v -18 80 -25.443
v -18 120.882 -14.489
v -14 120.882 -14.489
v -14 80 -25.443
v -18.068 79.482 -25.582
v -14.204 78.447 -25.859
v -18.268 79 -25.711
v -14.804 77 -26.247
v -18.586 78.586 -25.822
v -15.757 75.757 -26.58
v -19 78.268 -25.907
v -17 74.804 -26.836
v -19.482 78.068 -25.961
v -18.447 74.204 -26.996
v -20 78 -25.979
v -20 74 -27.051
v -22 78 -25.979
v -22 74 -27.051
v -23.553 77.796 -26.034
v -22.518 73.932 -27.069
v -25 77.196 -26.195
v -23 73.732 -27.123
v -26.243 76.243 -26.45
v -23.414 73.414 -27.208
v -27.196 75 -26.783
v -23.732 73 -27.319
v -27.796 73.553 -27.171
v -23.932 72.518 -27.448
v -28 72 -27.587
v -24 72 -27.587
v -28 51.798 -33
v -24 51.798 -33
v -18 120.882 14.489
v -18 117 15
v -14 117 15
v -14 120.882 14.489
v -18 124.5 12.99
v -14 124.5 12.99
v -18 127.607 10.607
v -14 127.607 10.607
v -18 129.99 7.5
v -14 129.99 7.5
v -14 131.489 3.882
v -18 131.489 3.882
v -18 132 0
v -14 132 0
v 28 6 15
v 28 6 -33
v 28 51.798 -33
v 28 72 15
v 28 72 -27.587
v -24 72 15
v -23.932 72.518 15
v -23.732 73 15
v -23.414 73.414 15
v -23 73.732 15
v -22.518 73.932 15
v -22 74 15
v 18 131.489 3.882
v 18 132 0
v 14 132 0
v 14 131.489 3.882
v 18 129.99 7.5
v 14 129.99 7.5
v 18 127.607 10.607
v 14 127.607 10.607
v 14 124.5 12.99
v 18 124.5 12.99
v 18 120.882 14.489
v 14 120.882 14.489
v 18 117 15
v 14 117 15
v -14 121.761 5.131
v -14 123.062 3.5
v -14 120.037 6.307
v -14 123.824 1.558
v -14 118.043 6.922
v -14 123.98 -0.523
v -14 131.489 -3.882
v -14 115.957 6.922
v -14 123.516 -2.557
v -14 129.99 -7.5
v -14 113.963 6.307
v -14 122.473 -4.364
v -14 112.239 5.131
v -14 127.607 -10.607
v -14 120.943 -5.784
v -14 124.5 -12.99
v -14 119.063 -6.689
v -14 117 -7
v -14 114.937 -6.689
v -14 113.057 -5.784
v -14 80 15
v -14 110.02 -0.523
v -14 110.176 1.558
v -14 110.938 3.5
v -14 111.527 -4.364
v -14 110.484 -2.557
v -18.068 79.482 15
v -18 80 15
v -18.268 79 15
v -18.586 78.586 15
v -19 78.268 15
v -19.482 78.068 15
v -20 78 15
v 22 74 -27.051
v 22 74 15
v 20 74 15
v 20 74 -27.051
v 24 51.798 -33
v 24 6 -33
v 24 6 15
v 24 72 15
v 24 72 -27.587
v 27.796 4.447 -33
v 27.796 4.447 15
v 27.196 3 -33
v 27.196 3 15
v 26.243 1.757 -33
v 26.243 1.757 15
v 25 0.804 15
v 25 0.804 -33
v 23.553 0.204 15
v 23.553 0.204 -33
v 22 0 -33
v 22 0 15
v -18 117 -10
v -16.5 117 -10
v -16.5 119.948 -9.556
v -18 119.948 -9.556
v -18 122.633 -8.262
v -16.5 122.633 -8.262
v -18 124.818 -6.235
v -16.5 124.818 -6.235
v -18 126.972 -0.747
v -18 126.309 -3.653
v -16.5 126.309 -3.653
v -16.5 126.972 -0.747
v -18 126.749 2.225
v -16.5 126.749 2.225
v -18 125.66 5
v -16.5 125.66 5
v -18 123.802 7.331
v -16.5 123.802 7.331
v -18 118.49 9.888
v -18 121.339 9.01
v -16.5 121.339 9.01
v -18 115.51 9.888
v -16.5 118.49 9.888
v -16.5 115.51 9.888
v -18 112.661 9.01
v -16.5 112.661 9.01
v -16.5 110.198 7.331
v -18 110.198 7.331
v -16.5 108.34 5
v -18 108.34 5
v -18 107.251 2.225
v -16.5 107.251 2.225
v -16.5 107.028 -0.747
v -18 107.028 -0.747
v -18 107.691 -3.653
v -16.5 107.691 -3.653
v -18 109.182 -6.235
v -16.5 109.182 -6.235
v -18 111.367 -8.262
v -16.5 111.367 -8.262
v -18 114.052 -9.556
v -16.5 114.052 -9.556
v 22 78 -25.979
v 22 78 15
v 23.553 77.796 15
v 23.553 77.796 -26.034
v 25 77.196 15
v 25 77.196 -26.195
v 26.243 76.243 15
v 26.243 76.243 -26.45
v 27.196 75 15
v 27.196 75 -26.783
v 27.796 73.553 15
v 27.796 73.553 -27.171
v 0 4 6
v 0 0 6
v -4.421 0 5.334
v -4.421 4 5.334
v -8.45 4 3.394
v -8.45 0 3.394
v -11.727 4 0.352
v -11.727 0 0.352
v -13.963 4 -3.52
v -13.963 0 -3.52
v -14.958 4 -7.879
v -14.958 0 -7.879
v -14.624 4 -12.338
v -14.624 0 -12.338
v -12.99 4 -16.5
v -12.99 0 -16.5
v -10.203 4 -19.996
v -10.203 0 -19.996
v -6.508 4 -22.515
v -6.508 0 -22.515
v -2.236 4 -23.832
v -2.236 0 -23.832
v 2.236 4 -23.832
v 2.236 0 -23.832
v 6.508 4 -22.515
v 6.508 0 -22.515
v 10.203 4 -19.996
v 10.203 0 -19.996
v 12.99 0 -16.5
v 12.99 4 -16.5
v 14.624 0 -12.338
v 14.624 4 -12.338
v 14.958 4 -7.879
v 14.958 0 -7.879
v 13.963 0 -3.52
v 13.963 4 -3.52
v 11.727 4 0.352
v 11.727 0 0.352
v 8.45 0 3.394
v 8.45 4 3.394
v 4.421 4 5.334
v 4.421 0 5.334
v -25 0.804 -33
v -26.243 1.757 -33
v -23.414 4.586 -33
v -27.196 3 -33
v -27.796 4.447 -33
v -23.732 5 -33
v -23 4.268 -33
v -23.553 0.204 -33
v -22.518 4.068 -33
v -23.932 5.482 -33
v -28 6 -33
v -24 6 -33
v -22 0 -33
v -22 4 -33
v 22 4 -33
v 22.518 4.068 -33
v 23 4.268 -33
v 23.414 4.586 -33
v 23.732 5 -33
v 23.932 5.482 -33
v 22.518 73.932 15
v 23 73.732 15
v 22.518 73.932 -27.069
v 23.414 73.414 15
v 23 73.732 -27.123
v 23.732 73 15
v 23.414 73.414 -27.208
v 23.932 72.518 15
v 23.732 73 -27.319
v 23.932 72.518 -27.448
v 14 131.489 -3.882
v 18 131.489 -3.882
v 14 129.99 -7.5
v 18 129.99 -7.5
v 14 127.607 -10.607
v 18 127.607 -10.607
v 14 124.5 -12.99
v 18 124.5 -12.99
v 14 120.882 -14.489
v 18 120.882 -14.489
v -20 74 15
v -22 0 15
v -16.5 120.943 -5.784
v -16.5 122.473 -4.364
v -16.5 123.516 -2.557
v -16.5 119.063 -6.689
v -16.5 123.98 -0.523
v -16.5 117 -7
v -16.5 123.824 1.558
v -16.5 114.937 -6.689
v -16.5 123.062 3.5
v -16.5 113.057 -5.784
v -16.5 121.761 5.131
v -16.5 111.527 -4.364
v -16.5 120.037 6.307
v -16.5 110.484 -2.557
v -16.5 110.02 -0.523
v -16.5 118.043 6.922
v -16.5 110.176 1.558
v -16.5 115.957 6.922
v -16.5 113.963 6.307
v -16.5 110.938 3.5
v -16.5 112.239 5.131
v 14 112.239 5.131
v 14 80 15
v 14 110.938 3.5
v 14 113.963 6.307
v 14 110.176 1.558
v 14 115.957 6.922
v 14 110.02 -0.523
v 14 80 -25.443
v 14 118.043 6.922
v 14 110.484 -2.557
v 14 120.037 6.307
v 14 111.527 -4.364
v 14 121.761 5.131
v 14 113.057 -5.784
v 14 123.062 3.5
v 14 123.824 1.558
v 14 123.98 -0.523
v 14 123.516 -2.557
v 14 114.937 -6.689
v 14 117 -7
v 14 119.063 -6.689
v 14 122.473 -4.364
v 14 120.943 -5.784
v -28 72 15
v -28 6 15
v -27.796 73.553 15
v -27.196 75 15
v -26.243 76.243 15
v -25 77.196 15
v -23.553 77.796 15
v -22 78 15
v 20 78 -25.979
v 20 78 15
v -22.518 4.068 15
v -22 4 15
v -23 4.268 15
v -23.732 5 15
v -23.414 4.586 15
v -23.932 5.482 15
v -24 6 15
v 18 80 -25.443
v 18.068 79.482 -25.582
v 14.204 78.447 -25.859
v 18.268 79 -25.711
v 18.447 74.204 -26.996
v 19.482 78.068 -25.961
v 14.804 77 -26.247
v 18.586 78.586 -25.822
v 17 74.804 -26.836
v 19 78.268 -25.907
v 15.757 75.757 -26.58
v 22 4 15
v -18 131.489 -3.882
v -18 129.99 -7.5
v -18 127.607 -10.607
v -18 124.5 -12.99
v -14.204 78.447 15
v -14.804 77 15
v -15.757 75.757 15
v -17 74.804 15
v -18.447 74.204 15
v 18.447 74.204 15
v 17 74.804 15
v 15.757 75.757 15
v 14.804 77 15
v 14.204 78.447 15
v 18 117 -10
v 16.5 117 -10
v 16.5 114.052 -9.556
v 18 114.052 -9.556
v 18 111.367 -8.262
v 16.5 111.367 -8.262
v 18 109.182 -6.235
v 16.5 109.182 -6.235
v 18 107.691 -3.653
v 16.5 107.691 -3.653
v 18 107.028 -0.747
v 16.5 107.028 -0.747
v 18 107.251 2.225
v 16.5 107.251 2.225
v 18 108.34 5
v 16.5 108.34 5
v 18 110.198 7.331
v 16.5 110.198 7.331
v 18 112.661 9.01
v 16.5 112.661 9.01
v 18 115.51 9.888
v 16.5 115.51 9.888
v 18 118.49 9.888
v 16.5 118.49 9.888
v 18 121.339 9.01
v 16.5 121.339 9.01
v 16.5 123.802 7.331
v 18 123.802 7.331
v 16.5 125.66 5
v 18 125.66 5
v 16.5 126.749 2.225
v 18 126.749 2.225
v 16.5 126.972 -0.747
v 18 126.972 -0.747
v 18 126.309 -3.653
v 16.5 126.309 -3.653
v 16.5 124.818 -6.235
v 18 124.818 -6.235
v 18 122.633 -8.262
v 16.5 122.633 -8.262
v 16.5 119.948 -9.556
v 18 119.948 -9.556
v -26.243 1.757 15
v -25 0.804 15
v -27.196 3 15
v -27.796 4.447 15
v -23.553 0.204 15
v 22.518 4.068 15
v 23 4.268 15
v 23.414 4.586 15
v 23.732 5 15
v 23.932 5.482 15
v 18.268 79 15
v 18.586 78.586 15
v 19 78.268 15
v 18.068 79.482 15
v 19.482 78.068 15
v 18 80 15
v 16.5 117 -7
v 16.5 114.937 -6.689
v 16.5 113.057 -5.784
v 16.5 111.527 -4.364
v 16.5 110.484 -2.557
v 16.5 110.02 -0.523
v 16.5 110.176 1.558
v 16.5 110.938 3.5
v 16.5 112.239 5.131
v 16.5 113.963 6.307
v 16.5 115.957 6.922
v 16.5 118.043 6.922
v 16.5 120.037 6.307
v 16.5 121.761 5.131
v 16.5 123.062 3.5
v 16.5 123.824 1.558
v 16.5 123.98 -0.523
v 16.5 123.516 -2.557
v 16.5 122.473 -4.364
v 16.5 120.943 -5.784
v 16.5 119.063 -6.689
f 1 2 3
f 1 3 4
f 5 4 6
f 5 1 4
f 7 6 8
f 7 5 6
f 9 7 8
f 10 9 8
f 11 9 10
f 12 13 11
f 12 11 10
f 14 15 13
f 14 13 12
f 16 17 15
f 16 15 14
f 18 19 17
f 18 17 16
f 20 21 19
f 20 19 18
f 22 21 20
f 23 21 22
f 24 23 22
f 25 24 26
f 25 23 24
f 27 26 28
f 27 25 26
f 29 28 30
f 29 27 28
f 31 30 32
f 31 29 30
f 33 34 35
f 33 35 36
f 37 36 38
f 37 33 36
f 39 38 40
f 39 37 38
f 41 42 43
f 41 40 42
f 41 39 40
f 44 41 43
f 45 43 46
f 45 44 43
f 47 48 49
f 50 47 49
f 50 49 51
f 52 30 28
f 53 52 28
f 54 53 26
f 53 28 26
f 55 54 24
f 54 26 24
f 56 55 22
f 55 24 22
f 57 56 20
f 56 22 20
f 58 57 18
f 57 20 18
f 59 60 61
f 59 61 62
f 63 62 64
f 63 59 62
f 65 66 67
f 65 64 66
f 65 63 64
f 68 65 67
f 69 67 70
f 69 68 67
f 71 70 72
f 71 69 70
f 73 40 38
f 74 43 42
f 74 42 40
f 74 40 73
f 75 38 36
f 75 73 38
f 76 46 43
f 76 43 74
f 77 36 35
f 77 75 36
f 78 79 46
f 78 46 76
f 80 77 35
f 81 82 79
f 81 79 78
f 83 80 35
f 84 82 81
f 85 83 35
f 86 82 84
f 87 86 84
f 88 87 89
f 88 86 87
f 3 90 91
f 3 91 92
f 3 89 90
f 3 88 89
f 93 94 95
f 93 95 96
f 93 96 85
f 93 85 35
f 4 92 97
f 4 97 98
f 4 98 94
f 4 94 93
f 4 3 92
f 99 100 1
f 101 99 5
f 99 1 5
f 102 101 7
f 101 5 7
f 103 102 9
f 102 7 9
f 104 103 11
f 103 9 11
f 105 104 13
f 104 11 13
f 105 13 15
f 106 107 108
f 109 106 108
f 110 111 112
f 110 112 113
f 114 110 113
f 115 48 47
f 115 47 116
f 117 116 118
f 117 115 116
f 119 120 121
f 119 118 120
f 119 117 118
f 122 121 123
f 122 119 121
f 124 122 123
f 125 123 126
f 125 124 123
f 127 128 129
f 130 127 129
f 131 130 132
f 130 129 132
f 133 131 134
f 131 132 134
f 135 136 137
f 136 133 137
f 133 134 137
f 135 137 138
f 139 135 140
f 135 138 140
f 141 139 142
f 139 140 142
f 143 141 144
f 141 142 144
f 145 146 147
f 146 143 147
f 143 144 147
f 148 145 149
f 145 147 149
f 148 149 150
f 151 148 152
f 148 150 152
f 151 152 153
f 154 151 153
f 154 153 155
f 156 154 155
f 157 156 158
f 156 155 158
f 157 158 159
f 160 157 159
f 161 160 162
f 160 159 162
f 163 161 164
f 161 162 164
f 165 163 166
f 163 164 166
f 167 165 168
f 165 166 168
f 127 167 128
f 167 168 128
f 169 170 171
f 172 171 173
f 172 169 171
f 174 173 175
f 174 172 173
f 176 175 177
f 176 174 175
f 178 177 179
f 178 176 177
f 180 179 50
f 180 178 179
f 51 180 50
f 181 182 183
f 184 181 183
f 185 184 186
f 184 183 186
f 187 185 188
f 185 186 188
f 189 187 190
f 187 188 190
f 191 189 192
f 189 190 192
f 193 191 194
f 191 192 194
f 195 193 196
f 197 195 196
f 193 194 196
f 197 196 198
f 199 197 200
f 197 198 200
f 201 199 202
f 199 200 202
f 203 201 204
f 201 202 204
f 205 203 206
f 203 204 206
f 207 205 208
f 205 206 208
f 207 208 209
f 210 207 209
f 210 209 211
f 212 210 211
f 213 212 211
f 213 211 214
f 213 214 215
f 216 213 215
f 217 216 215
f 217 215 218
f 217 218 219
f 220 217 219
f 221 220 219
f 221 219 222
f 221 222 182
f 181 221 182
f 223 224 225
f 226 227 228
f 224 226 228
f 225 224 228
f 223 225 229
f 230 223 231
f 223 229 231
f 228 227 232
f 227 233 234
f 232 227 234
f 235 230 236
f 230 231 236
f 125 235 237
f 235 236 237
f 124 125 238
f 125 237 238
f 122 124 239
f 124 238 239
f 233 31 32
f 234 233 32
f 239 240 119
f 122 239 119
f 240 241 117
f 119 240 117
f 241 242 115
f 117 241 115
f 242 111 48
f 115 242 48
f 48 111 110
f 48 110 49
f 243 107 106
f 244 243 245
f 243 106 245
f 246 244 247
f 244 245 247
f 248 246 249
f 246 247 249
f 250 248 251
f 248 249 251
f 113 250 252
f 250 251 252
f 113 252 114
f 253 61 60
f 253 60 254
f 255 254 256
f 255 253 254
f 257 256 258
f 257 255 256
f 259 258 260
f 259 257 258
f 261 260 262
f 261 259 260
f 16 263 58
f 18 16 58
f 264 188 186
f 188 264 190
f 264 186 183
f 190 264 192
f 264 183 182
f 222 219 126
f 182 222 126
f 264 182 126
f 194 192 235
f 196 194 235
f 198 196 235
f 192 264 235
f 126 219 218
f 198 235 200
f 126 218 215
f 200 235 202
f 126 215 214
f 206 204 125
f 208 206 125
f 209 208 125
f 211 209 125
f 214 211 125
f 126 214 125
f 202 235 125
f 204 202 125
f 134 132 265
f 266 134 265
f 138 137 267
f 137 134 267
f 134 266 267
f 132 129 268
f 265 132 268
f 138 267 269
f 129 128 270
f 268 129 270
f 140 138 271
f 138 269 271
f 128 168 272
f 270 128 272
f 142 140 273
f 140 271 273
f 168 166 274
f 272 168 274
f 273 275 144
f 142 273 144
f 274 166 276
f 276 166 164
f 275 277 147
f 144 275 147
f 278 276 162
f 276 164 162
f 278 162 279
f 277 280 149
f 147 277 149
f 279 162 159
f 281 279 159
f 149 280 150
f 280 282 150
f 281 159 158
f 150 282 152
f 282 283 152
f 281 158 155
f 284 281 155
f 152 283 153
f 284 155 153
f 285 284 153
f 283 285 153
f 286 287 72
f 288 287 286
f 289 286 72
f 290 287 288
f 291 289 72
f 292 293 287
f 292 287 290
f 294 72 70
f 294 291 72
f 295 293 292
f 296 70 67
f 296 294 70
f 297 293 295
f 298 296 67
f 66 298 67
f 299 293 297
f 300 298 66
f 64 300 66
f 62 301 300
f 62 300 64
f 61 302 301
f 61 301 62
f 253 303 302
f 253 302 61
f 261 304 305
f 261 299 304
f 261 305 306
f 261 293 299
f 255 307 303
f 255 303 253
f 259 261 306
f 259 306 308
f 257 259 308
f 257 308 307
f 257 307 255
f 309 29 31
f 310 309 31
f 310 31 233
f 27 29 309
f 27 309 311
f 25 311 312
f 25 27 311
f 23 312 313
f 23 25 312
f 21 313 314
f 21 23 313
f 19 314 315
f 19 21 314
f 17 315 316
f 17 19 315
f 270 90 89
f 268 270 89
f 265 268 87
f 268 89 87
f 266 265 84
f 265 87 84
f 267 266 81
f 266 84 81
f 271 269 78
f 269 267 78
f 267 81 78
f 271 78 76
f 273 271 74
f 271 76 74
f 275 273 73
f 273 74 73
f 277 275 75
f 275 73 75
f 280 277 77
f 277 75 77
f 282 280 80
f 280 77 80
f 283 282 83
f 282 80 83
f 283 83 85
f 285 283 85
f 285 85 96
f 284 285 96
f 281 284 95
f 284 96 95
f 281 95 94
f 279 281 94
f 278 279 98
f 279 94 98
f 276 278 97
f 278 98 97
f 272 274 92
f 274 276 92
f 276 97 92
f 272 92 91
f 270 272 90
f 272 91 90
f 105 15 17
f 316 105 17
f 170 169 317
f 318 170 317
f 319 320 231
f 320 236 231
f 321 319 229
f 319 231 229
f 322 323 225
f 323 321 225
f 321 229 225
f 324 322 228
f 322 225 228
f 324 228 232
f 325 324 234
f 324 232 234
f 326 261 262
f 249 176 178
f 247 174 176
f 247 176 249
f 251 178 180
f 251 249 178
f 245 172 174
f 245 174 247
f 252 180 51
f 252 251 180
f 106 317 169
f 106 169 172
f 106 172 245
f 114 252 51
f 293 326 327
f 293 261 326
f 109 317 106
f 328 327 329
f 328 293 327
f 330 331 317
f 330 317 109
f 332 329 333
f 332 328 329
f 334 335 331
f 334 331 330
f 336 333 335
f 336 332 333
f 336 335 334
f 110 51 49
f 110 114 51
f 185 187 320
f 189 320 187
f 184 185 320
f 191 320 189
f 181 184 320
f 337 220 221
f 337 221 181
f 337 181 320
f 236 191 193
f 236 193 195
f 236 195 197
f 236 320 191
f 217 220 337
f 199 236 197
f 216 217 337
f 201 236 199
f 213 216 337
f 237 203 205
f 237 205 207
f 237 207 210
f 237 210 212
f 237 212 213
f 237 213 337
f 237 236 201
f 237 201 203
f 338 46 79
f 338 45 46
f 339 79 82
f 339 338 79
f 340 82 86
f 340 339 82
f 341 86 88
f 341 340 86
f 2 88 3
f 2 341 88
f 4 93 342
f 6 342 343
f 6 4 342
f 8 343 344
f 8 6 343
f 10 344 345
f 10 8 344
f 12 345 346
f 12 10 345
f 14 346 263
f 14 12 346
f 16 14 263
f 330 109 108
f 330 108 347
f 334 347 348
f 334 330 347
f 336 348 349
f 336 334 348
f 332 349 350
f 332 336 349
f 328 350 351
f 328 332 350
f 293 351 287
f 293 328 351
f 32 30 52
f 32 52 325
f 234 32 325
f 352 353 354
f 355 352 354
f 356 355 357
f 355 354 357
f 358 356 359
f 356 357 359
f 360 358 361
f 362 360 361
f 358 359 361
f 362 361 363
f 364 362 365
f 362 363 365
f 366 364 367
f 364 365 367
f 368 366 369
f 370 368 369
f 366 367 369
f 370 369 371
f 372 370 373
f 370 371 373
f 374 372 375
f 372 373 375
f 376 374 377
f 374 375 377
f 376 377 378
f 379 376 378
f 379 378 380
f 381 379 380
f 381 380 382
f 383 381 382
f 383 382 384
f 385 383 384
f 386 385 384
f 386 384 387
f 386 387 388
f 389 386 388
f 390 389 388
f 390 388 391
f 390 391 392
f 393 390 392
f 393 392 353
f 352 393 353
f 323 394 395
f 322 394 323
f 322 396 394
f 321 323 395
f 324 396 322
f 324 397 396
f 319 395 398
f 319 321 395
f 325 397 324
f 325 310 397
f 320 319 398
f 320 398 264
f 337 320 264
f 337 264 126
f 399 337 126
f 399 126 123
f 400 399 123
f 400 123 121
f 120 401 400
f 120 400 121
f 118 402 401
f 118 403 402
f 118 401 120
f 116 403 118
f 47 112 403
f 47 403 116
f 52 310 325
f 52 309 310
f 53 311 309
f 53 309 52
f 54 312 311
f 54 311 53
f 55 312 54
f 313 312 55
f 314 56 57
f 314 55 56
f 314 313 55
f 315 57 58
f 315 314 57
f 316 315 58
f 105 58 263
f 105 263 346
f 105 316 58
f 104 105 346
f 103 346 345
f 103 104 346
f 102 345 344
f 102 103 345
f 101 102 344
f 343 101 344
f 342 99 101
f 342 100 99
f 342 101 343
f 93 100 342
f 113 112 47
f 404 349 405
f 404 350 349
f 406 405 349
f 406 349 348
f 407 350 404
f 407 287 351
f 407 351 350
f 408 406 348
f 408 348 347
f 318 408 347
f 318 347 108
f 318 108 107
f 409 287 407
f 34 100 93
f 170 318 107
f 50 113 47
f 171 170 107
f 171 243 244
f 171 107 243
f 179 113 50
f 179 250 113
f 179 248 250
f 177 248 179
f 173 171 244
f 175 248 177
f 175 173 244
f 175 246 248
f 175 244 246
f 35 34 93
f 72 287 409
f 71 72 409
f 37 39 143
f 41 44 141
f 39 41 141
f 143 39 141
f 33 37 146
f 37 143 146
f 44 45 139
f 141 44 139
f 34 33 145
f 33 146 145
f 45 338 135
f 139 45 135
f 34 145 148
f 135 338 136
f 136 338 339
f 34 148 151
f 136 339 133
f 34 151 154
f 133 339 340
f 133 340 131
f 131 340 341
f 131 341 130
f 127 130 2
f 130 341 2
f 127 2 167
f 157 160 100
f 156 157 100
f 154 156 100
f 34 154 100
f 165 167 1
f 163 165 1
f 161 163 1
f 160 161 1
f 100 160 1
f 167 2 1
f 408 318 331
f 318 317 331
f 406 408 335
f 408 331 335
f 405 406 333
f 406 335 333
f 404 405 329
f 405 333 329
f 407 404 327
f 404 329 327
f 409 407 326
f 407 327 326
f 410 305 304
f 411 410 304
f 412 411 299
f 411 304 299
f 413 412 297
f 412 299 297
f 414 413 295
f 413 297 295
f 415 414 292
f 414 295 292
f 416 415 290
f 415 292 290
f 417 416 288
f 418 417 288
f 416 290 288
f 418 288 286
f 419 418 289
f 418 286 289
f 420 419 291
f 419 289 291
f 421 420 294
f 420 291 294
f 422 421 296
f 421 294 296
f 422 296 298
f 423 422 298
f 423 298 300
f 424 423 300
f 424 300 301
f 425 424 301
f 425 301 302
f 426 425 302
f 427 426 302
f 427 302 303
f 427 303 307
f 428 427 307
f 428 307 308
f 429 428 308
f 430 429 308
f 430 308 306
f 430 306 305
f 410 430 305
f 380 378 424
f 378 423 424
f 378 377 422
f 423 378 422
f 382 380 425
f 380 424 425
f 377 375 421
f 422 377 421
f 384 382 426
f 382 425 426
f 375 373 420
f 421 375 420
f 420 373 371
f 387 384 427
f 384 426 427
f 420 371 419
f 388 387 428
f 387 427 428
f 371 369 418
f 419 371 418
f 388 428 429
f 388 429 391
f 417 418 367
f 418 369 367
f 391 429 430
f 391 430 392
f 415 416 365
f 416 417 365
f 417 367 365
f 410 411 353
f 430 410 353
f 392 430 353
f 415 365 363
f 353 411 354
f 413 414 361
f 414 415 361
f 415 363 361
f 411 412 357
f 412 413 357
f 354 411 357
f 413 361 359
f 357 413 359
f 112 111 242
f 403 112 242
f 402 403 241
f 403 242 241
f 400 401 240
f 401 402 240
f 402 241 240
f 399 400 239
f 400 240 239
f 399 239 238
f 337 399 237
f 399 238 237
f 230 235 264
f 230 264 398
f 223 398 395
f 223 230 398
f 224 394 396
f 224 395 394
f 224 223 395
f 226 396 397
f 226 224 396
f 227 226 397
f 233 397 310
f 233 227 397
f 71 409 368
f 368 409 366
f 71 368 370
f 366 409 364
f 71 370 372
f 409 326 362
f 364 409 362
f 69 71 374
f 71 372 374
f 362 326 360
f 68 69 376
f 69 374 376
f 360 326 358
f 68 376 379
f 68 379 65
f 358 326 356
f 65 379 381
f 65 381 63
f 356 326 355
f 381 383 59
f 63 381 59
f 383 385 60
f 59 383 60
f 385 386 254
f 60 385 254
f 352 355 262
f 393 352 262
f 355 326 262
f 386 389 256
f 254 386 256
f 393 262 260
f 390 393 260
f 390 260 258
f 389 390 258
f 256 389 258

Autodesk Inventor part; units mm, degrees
ref_plane "YZ Plane" through (0, 0, 0) normal (1, 0, 0) x (0, 1, 0)
ref_plane "XZ Plane" through (0, 0, 0) normal (0, 1, 0) x (-1, 0, 0)
ref_plane "XY Plane" through (0, 0, 0) normal (0, 0, 1) x (1, 0, 0)
sketch "Sketch1" plane through (0, 0, 0) normal (0, 0, 1) x (1, 0, 0)
  line L0 (-18, 132) -> (-18, 80)
  line L1 (-20, 78) -> (-22, 78)
  line L2 (-28, 72) -> (-28, 6)
  line L3 (-22, 0) -> (22, 0)
  line L4 (28, 6) -> (28, 72)
  line L5 (22, 78) -> (20, 78)
  line L6 (18, 80) -> (18, 132)
  arc A0 (-28, 6) -> (-22, 0) centre (-22, 6) ccw
  arc A1 (-22, 78) -> (-28, 72) centre (-22, 72) ccw
  arc A2 (28, 72) -> (22, 78) centre (22, 72) ccw
  arc A3 (22, 0) -> (28, 6) centre (22, 6) ccw
  arc A4 (-20, 78) -> (-18, 80) centre (-20, 80) ccw
  arc A5 (18, 80) -> (20, 78) centre (20, 80) ccw
  line L7 (-14, 132) -> (-14, 80)
  arc A6 (-20, 74) -> (-14, 80) centre (-20, 80) ccw
  line L8 (-20, 74) -> (-22, 74)
  arc A7 (-22, 74) -> (-24, 72) centre (-22, 72) ccw
  line L9 (-24, 72) -> (-24, 6)
  arc A8 (-24, 6) -> (-22, 4) centre (-22, 6) ccw
  line L10 (-22, 4) -> (22, 4)
  arc A9 (22, 4) -> (24, 6) centre (22, 6) ccw
  line L11 (24, 6) -> (24, 72)
  arc A10 (24, 72) -> (22, 74) centre (22, 72) ccw
  line L12 (22, 74) -> (20, 74)
  arc A11 (14, 80) -> (20, 74) centre (20, 80) ccw
  line L13 (14, 80) -> (14, 132)
  line L14 (14, 132) -> (18, 132)
  line L15 (-14, 132) -> (-18, 132)
  point P0 (0, 0)
  point P1 (0, 0)
  dimension "d0" = 132
  dimension "d1" = 6
  dimension "d2" = 2
  dimension "d3" = 56
  dimension "d4" = 36
  dimension "d5" = 4
  dimension "d6" = 78
extrude "Extrusion1" add sketch "Sketch1" along normal blind 15 and the other way blind 33
fillet "Fillet1" radius 15 2 edges at (-16, 132, 15) (16, 132, 15)
sketch "Sketch3" plane through (0, 0, 0) normal (1, 0, 0) x (0, 1, 0)
  arc A0 (132, 0) -> (117, 15) centre (117, 0) ccw projected
  line L0 (72, -33) -> (6, -33) projected
  arc A1 (120.8823, -14.4889) -> (132, 0) centre (117, 0) ccw
  line L1 (120.8823, -14.4889) -> (51.7979, -33)
  line L2 (6, 15) -> (72, 15) projected
  line L3 (51.7979, -33) -> (132, -33)
  line L4 (132, -33) -> (132, 0) projected
  point P0 (0, 0)
  dimension "d12" = 15
extrude "Extrusion2" cut sketch "Sketch3" along normal through all both and the other way through all
sketch "Sketch4" plane through (18, 80, 15) normal (1, 0, 0) x (0, 0, -1)
  arc A0 (29.4889, 40.8823) -> (0, 37) centre (15, 37) ccw projected
  point P0 (15, -80)
hole "Hole1" at (18, 117, 0) direction (-1, 0, 0) diameter 14 depth 4 counterbore diameter 20 counterbore depth 1.5
mirror "Mirror1" about plane through (0, 0, 0) normal (1, 0, 0) of "Hole1"
sketch "Sketch5" plane through (-22, 4, 15) normal (0, 1, 0) x (1, 0, 0)
  line L0 (44, 48) -> (0, 0)
  point P0 (22, 15)
  point P1 (22, 24)
hole "Hole2" at (0, 4, -9) direction (0, -1, 0) diameter 30 end through all
properties part number "Part021. High fork" material "Steel, Carbon"
